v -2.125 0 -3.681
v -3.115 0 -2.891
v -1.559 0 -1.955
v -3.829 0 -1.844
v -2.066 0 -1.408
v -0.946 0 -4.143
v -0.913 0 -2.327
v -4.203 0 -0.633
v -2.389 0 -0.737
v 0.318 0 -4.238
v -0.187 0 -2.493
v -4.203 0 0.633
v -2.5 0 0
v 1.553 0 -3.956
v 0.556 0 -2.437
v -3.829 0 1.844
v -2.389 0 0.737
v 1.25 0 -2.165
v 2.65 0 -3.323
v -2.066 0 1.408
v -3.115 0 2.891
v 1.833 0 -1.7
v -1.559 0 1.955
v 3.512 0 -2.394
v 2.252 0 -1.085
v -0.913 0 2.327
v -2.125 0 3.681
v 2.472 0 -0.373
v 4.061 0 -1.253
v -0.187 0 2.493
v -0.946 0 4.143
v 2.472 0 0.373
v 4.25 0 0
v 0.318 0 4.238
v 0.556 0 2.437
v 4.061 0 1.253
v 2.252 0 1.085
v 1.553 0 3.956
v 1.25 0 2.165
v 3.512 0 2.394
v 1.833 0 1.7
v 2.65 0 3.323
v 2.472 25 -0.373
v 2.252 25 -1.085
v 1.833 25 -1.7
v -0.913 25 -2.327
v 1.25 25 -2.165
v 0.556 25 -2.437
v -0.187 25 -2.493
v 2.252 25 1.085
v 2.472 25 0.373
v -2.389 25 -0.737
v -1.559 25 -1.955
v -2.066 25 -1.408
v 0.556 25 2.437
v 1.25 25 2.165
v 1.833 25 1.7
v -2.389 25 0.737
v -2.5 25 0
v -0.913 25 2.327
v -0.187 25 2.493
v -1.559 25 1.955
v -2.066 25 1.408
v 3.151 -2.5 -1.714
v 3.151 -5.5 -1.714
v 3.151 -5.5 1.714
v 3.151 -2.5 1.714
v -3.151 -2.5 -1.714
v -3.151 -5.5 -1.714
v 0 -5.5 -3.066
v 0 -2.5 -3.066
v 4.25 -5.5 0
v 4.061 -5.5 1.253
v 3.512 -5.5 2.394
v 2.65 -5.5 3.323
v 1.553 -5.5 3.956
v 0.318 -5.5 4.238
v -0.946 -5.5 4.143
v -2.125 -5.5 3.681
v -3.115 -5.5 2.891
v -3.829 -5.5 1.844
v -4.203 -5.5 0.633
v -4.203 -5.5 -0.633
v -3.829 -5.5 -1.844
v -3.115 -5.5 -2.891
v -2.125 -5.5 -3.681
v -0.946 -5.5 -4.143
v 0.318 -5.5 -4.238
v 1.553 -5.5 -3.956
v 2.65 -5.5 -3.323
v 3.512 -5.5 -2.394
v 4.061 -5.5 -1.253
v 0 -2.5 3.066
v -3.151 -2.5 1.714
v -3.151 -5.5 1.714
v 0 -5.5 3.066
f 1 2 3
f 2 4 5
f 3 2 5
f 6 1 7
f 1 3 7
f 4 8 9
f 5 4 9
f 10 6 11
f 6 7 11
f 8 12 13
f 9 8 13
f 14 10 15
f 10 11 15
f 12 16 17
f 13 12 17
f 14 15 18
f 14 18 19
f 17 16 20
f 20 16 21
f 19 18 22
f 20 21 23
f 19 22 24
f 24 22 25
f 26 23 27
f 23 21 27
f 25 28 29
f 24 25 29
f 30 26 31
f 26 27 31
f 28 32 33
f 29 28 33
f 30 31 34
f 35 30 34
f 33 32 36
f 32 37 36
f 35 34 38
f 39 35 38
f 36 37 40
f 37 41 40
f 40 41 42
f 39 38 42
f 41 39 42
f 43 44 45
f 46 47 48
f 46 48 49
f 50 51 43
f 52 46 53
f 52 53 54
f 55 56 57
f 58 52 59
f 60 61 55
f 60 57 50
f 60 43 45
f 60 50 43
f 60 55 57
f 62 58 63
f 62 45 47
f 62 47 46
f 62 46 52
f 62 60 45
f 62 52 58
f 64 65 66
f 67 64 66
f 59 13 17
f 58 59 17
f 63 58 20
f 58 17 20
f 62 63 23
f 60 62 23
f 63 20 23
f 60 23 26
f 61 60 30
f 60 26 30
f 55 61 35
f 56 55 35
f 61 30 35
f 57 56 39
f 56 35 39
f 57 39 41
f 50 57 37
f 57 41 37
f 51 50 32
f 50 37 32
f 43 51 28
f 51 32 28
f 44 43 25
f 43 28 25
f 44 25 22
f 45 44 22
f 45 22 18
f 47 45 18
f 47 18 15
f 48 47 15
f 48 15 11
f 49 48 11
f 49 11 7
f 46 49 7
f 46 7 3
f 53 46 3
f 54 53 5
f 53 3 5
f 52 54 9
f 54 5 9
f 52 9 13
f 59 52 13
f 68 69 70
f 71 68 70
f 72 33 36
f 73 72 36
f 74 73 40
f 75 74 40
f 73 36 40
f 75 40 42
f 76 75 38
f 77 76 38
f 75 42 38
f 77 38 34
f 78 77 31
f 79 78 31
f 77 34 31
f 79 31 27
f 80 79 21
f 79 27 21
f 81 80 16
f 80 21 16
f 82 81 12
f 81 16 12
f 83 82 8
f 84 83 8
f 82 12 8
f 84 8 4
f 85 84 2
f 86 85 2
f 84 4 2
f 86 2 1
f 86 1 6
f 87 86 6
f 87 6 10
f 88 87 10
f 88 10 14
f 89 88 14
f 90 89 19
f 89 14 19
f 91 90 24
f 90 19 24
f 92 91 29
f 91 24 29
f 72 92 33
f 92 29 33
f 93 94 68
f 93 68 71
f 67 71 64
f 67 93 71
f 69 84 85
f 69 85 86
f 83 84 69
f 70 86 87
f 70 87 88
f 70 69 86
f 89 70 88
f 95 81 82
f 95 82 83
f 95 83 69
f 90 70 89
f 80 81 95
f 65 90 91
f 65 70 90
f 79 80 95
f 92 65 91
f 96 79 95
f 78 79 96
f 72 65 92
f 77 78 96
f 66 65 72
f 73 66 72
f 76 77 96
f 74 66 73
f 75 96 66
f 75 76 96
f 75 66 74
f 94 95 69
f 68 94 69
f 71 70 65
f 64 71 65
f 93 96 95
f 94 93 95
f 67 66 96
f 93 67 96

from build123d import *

# Parameters (mm, degrees)
F0_R     = 4.25
F1_DEPTH = 5.5
F3_DEPTH = 3
F4_R     = 2.5
F5_DEPTH = 25


with BuildPart() as f1:
    # F0 (on Front) → F1 (new body)
    with BuildSketch(Plane.XZ):
        Circle(F0_R)
    extrude(amount=F1_DEPTH)

    # F2 (on face) → F3 (cut)
    with BuildSketch(Plane.XZ.offset(5.5)):
        Polygon((3.151009, 1.714376), (0, 3.066219), (0, 0), (3.151009, 0), align=None)
        Polygon((0, 0), (0, 3.066219), (-3.151009, 1.714376), (-3.151009, 0), align=None)
        Polygon((3.151009, 0), (0, 0), (0, -3.066219), (3.151009, -1.714376), align=None)
        Polygon((0, -3.066219), (0, 0), (-3.151009, 0), (-3.151009, -1.714376), align=None)
    extrude(amount=-F3_DEPTH, mode=Mode.SUBTRACT)

    # F4 (on face) → F5 (join)
    with BuildSketch(Plane(origin=(0, 0, 0), x_dir=(-1, 0, 0), z_dir=(0, 1, 0))):
        Circle(F4_R)
    extrude(amount=F5_DEPTH)


solid = f1.part
